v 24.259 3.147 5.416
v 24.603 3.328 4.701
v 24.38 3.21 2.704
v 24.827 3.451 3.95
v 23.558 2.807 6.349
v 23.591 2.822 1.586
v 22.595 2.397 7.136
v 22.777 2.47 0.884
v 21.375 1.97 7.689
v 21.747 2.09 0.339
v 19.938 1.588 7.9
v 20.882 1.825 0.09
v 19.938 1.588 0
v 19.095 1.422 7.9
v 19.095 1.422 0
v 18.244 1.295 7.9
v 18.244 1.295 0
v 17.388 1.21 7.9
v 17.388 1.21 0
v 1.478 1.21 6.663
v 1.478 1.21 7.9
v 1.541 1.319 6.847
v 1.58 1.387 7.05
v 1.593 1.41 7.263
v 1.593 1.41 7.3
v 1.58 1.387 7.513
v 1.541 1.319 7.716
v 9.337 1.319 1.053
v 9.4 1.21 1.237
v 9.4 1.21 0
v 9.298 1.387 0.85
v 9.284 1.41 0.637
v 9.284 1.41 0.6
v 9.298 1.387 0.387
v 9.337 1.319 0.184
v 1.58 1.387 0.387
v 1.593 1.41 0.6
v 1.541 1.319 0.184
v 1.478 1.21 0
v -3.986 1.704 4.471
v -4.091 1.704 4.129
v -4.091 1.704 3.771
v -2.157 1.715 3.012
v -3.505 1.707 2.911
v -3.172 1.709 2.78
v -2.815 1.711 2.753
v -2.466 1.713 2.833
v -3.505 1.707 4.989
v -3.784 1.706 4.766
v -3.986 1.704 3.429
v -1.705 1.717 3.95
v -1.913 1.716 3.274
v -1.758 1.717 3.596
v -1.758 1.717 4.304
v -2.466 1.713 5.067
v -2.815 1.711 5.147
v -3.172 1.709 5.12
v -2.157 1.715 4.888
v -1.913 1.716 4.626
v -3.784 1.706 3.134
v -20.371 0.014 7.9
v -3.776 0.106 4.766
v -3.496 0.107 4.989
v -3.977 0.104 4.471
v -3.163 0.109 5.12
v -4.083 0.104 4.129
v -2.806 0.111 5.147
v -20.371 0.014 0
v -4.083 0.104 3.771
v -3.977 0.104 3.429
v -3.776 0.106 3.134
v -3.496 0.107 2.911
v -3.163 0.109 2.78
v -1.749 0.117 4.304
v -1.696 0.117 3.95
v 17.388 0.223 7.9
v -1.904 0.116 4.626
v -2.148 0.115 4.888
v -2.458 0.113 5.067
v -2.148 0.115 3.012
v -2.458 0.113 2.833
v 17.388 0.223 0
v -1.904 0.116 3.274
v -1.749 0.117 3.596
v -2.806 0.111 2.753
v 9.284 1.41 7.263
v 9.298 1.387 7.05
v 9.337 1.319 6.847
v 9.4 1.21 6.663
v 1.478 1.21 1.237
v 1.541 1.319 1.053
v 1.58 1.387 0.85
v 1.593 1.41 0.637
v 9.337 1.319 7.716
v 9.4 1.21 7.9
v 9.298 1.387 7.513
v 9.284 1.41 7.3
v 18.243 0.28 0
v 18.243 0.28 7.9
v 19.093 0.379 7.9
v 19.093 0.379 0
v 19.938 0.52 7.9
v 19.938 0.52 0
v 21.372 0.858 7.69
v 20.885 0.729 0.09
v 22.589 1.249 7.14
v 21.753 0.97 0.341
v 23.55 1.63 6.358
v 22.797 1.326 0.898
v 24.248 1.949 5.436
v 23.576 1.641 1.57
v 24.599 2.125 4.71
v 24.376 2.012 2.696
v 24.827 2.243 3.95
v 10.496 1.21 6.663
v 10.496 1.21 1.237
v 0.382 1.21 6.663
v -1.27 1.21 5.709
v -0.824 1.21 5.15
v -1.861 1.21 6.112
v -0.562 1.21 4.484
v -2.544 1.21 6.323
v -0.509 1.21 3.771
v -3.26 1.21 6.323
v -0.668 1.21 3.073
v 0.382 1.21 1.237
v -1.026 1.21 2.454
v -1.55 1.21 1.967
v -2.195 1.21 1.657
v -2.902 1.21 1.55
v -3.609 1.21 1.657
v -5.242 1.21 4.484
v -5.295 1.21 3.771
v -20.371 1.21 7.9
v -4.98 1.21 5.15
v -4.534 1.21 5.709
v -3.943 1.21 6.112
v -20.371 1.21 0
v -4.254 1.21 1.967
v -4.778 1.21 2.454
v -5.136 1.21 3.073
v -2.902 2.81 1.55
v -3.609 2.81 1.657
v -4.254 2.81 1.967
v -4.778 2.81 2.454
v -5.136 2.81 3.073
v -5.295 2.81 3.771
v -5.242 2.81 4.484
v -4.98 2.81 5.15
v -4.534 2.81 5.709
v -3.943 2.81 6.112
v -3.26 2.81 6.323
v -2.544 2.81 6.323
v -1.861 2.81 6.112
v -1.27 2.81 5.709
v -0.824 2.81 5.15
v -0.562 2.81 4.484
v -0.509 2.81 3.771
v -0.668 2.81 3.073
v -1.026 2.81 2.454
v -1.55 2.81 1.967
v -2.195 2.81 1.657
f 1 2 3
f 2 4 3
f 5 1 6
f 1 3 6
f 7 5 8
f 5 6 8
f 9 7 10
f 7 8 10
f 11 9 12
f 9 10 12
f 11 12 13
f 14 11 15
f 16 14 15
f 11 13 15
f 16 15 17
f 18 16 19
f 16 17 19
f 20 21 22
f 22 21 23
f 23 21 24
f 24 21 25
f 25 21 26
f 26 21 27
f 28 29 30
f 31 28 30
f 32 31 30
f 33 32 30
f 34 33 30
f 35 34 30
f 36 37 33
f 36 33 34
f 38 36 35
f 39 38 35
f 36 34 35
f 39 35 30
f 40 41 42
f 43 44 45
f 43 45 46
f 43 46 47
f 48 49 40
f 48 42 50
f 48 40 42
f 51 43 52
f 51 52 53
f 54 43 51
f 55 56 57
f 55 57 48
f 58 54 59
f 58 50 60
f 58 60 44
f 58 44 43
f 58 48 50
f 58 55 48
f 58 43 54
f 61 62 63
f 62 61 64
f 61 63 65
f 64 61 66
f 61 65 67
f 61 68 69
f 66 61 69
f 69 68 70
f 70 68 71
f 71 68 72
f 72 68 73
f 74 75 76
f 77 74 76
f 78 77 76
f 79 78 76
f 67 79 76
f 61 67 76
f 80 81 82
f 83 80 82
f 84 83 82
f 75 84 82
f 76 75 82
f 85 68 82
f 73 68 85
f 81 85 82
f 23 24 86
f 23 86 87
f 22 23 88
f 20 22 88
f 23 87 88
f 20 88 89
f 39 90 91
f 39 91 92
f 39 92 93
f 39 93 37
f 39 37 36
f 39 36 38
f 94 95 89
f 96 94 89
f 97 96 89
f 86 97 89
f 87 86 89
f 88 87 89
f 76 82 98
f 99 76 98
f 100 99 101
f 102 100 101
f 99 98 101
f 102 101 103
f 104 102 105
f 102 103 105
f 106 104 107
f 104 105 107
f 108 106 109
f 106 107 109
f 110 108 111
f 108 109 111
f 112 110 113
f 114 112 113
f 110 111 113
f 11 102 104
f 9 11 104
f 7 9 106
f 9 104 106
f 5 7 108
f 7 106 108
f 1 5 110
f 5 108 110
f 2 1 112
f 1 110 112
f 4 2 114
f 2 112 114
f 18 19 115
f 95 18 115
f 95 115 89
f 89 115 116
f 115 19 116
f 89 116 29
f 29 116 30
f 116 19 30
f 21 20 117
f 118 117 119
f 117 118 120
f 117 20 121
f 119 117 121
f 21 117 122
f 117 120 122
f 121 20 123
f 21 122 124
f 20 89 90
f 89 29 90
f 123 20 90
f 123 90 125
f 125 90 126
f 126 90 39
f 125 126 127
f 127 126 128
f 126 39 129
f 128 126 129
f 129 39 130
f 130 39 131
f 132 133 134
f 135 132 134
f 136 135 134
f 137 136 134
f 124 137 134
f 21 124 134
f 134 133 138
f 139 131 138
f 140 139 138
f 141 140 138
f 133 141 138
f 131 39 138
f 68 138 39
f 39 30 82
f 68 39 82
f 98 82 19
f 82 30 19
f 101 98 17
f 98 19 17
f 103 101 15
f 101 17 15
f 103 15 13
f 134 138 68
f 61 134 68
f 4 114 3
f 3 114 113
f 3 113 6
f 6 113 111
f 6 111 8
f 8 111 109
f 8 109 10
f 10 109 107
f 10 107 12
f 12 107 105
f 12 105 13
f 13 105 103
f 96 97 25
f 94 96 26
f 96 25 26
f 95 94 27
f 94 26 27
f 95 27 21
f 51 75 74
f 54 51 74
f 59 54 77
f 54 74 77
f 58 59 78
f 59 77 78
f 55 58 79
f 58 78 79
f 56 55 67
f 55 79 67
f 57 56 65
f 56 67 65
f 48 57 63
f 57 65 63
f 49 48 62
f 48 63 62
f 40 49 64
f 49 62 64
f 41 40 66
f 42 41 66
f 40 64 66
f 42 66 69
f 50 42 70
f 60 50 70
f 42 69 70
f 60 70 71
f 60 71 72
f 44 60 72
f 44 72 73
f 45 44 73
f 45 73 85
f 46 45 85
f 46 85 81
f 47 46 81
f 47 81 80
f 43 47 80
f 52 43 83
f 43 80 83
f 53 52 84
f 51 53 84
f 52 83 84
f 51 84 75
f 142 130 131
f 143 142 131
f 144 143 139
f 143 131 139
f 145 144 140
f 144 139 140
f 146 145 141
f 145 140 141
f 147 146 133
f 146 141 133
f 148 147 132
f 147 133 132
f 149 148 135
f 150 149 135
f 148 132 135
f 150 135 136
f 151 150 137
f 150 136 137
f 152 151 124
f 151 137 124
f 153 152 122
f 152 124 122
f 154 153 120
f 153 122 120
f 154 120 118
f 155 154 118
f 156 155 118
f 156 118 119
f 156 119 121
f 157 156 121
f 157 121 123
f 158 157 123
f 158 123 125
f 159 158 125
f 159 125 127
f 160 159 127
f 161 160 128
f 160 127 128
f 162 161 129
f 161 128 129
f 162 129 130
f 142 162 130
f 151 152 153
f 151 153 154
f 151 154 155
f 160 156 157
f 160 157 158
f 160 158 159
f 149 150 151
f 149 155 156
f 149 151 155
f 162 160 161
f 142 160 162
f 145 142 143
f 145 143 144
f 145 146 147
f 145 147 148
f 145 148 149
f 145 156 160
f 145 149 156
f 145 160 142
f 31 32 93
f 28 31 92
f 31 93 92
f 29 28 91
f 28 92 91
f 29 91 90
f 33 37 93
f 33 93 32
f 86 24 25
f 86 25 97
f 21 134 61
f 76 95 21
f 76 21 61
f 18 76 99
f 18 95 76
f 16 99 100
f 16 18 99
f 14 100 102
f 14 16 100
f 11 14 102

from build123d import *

# Parameters (mm, degrees)
SKATEBOARDBASE_DEPTH         = 7.9
CURVEDFRONT_R                = 5
SKETCH2_R                    = 2.4
STUD_DEPTH                   = 1.6
SKETCH3_W                    = 7.922196178
SKETCH3_H                    = 1.23692935
UPPERNOTCHES_DEPTH           = 0.2
UPPERNOTCHES_DRAFT           = 30
UPPERNOTCHES_PROFILE_2_DEPTH = 0.2
UPPERNOTCHES_PROFILE_2_DRAFT = 30
NOTCHFILLET_R                = 1
SKETCH4_R                    = 1.2
UNDERSTUDHOLE_DEPTH          = 1.6


with BuildPart() as part:
    # Sketch1 → SkateBoardBase (new body)
    with BuildSketch(Plane.XY):
        with BuildLine():
            Line((-20.371469293, 0.013768995), (17.388032716, 0.222549812))
            ThreePointArc((17.388032716, 0.222549812), (21.281619196, 0.833021385), (24.938309637, 2.303159558))
            Line((24.938309637, 2.303159558), (24.938309637, 3.514270646))
            ThreePointArc((24.938309637, 3.514270646), (21.290682244, 1.944239503), (17.388032716, 1.209726022))
            Line((17.388032716, 1.209726022), (-20.371469293, 1.209726022))
            Line((-20.371469293, 1.209726022), (-20.371469293, 0.013768995))
        make_face()
    extrude(amount=SKATEBOARDBASE_DEPTH)

    # CurvedFront
    # the kernel refuses this fillet: 5 mm, written as the material it takes off along each edge
    with BuildSketch(Plane(origin=(24.938309637, -10.196840442, 0), x_dir=(0, 0, 1), z_dir=(0, 1, 0))) as curvedfront_piece_1:
        with BuildLine():
            CenterArc((CURVEDFRONT_R, -CURVEDFRONT_R), CURVEDFRONT_R, 90, 90)
            Line((0, -CURVEDFRONT_R), (0, 0))
            Line((0, 0), (CURVEDFRONT_R, 0))
        make_face()
    extrude(amount=26.211111088, mode=Mode.SUBTRACT)
    with BuildSketch(Plane(origin=(24.938309637, -10.196840442, 7.9), x_dir=(0, 0, -1), z_dir=(0, 1, 0))) as curvedfront_piece_2:
        with BuildLine():
            CenterArc((CURVEDFRONT_R, CURVEDFRONT_R), CURVEDFRONT_R, 180, 90)
            Line((0, CURVEDFRONT_R), (0, 0))
            Line((0, 0), (CURVEDFRONT_R, 0))
        make_face()
    extrude(amount=26.211111088, mode=Mode.SUBTRACT)

    # Sketch2 → Stud (add)
    with BuildSketch(Plane(origin=(0, 1.209726022, 0), x_dir=(1, 0, 0), z_dir=(0, 1, 0))):
        with Locations(Location((-2.902006395, -3.95, 0), (0, 0, 90))):
            Circle(SKETCH2_R)
    extrude(amount=STUD_DEPTH)


with BuildPart() as uppernotches_tool:
    # Sketch3 → UpperNotches (with draft: the straight prism first)
    with BuildSketch(Plane(origin=(0, 1.209726022, 0), x_dir=(1, 0, 0), z_dir=(0, 1, 0))):
        with Locations((5.4387323, -0.618464675)):
            Rectangle(SKETCH3_W, SKETCH3_H)
    extrude(amount=UPPERNOTCHES_DEPTH)
    # UpperNotches: the draft: its side faces are tilted about the plane it starts from
    uppernotches_sides = [uppernotches_tool.faces().sort_by_distance(p)[0] for p in [
        (1.477634211, 1.309726022, 0.618464675),
        (5.4387323, 1.309726022, 1.23692935),
        (9.399830389, 1.309726022, 0.618464675),
        (5.4387323, 1.309726022, 0),
    ]]
    draft(uppernotches_sides, Plane(origin=(0, 1.209726022, 0), x_dir=(1, 0, 0), z_dir=(0, 1, 0)), UPPERNOTCHES_DRAFT)


with BuildPart() as part_1:
    add(part.part)

    # UpperNotches: add uppernotches_tool
    add(uppernotches_tool.part)


with BuildPart() as uppernotches_profile_2_tool:
    # Sketch3 → UpperNotches profile 2 (with draft: the straight prism first)
    with BuildSketch(Plane(origin=(0, 1.209726022, 0), x_dir=(1, 0, 0), z_dir=(0, 1, 0))):
        with Locations((5.4387323, -7.281535325)):
            Rectangle(SKETCH3_W, SKETCH3_H)
    extrude(amount=UPPERNOTCHES_PROFILE_2_DEPTH)
    # UpperNotches profile 2: the draft: its side faces are tilted about the plane it starts from
    uppernotches_profile_2_sides = [uppernotches_profile_2_tool.faces().sort_by_distance(p)[0] for p in [
        (5.4387323, 1.309726022, 6.66307065),
        (1.477634211, 1.309726022, 7.281535325),
        (5.4387323, 1.309726022, 7.9),
        (9.399830389, 1.309726022, 7.281535325),
    ]]
    draft(uppernotches_profile_2_sides, Plane(origin=(0, 1.209726022, 0), x_dir=(1, 0, 0), z_dir=(0, 1, 0)), UPPERNOTCHES_PROFILE_2_DRAFT)


with BuildPart() as part_2:
    add(part_1.part)

    # UpperNotches profile 2: add uppernotches_profile_2_tool
    add(uppernotches_profile_2_tool.part)

    # NotchFillet
    # the kernel refuses this fillet: 1 mm, written as the material it takes off along each edge
    with BuildSketch(Plane(origin=(0.381779399, 1.409726022, 1.121459296), x_dir=(0, -0.8660254037844376, 0.5000000000000017), z_dir=(1, 0, 0)), Plane(origin=(10.4956852, 1.409726022, 0.115470054), x_dir=(0, -0.8660254037844383, -0.5000000000000008), z_dir=(-1, 0, 0)), Plane(origin=(0.381779399, 1.409726022, 7.784529946), x_dir=(0, -0.8660254037844378, 0.5000000000000013), z_dir=(1, 0, 0)), Plane(origin=(10.4956852, 1.409726022, 6.778540704), x_dir=(0, -0.8660254037844378, -0.5000000000000013), z_dir=(-1, 0, 0))) as notchfillet_piece_1:
        with BuildLine():
            CenterArc((0.623760431, 0.919615242), NOTCHFILLET_R, 210, 36.869897646)
            Line((-0.242264973, 0.419615242), (-0.259585481, 0.409615242))
            Line((-0.259585481, 0.409615242), (-0.017320508, -0.01))
            Line((-0.017320508, -0.01), (0, -0.02))
            ThreePointArc((0, -0.02), (0.115470054, -0.02), (0.223083701, -0.018392305))
            Line((0.223083701, -0.018392305), (0.230940108, 0))
        make_face()
    extrude(amount=10.113905801, mode=Mode.SUBTRACT)

    # Sketch4 → UnderStudHole (cut)
    with BuildSketch(Plane(origin=(-0.000698914, 0.126403586, 0), x_dir=(-0.9999847141809186, -0.005529141389625959, 0), z_dir=(0.005529141389625959, -0.9999847141809186, 0))):
        with Locations(Location((2.895273289, -3.95, 0), (0, 0, 180))):
            Circle(SKETCH4_R)
    extrude(amount=-UNDERSTUDHOLE_DEPTH, mode=Mode.SUBTRACT)


solid = part_2.part
